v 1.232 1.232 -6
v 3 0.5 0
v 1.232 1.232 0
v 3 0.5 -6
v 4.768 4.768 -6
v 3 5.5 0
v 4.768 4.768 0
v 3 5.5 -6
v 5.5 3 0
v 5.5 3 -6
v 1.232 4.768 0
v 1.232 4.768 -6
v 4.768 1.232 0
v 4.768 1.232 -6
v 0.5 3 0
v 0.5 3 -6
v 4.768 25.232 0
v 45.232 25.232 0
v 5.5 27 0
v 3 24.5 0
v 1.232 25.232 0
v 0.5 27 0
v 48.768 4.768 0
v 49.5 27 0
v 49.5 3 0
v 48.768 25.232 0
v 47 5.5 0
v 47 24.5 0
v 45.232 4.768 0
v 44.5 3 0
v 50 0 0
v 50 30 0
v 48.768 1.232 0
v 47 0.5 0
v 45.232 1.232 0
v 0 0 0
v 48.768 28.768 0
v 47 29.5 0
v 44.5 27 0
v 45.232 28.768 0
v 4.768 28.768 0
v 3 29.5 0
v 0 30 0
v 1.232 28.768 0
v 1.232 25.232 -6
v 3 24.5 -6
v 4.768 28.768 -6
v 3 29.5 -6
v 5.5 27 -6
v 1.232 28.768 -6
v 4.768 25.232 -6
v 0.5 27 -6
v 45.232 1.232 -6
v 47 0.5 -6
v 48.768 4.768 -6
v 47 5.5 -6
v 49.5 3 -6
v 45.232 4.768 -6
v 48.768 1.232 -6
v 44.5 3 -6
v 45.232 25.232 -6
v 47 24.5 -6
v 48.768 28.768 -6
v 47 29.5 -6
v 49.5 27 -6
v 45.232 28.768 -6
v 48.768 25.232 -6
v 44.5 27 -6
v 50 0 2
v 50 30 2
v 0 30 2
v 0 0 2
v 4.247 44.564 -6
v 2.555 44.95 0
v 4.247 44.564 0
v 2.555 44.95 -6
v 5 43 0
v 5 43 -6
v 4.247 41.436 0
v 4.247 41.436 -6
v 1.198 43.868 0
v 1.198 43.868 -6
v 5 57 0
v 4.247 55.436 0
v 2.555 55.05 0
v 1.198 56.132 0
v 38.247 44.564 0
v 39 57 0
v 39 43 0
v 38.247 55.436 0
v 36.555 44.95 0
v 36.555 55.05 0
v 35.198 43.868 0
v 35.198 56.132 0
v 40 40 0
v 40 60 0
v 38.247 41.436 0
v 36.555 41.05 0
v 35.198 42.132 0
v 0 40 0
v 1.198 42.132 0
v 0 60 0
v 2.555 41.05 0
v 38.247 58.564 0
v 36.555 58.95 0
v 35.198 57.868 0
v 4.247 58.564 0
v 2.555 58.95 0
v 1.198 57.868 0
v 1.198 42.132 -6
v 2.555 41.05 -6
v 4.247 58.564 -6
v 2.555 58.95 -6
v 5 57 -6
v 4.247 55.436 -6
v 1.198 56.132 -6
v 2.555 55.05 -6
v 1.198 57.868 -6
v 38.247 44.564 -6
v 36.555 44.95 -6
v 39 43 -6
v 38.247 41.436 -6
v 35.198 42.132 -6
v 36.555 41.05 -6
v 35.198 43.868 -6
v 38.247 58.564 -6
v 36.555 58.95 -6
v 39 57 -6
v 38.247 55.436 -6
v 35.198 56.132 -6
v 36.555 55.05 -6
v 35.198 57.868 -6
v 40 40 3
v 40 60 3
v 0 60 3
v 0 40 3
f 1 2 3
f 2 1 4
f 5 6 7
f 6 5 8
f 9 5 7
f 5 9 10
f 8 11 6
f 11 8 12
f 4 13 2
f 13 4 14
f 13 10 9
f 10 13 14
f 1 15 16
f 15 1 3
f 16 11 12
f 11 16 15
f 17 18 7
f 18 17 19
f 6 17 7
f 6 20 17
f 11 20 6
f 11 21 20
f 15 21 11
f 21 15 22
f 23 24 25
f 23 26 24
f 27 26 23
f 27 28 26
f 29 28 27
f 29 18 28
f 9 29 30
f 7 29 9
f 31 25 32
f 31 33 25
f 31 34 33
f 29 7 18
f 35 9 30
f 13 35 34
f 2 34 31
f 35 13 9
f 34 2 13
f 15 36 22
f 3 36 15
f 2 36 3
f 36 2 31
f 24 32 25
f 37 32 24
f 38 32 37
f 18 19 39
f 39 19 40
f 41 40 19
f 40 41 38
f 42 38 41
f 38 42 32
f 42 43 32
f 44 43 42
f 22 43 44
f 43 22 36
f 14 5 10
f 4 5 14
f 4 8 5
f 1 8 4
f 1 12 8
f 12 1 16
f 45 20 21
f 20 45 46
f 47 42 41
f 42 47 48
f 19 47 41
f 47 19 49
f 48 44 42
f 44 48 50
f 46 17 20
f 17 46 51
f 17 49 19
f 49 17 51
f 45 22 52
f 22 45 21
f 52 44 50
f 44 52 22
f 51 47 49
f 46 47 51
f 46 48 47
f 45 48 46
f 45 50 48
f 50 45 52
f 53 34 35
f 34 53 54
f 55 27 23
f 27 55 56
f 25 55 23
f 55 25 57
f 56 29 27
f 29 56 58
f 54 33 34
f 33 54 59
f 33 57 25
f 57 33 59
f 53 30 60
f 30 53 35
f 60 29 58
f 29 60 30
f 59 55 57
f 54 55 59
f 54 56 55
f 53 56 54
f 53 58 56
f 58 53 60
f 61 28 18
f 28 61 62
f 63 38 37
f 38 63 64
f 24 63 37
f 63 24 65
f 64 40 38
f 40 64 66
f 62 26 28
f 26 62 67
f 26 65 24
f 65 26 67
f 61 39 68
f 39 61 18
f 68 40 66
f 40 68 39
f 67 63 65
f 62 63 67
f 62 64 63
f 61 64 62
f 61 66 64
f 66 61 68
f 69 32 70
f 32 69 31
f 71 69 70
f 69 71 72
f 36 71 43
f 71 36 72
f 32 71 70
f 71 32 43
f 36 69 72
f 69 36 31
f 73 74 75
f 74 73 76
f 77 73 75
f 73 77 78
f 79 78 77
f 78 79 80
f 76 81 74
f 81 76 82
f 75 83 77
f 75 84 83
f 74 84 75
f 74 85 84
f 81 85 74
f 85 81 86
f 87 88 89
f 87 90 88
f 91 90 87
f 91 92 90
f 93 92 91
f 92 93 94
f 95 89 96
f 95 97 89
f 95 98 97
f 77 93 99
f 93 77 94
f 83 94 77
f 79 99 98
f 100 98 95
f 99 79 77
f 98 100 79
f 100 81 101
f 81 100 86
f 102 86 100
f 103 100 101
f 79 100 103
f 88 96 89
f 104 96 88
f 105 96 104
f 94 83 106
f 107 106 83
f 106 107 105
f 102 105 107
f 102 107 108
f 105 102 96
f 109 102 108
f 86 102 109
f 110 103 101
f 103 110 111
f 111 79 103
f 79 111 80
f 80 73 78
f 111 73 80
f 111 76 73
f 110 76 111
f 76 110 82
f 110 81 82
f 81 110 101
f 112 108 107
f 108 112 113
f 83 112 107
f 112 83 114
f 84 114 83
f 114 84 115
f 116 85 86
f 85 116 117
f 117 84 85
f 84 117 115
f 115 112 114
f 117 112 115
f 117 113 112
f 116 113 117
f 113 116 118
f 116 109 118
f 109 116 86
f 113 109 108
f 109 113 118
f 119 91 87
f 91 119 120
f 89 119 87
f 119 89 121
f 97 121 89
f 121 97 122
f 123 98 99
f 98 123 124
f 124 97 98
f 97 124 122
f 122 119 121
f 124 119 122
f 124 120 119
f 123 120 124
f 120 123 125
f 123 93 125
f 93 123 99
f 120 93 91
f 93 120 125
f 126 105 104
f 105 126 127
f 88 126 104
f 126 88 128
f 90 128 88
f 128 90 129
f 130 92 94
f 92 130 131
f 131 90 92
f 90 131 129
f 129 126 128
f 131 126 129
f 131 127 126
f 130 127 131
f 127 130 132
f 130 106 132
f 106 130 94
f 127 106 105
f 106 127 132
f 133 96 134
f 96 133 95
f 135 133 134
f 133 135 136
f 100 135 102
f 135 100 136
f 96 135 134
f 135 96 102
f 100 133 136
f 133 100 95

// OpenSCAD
// Zweck: Module mit Parametern und children() – Füße an den Ecken einer Platte.
module corners(w, d) {
    for (x = [0, w], y = [0, d]) translate([x, y, 0]) children();
}
module plate(w = 40, d = 30, t = 2) {
    cube([w, d, t]);
    translate([0, 0, -6]) corners(w - 6, d - 6) translate([3, 3, 0]) children(0);
}
module foot(r = 2) cylinder(h = 6, r = r);
plate(w = 50) foot(r = 2.5);
translate([0, 40, 0]) plate(d = 20, t = 3) foot();
